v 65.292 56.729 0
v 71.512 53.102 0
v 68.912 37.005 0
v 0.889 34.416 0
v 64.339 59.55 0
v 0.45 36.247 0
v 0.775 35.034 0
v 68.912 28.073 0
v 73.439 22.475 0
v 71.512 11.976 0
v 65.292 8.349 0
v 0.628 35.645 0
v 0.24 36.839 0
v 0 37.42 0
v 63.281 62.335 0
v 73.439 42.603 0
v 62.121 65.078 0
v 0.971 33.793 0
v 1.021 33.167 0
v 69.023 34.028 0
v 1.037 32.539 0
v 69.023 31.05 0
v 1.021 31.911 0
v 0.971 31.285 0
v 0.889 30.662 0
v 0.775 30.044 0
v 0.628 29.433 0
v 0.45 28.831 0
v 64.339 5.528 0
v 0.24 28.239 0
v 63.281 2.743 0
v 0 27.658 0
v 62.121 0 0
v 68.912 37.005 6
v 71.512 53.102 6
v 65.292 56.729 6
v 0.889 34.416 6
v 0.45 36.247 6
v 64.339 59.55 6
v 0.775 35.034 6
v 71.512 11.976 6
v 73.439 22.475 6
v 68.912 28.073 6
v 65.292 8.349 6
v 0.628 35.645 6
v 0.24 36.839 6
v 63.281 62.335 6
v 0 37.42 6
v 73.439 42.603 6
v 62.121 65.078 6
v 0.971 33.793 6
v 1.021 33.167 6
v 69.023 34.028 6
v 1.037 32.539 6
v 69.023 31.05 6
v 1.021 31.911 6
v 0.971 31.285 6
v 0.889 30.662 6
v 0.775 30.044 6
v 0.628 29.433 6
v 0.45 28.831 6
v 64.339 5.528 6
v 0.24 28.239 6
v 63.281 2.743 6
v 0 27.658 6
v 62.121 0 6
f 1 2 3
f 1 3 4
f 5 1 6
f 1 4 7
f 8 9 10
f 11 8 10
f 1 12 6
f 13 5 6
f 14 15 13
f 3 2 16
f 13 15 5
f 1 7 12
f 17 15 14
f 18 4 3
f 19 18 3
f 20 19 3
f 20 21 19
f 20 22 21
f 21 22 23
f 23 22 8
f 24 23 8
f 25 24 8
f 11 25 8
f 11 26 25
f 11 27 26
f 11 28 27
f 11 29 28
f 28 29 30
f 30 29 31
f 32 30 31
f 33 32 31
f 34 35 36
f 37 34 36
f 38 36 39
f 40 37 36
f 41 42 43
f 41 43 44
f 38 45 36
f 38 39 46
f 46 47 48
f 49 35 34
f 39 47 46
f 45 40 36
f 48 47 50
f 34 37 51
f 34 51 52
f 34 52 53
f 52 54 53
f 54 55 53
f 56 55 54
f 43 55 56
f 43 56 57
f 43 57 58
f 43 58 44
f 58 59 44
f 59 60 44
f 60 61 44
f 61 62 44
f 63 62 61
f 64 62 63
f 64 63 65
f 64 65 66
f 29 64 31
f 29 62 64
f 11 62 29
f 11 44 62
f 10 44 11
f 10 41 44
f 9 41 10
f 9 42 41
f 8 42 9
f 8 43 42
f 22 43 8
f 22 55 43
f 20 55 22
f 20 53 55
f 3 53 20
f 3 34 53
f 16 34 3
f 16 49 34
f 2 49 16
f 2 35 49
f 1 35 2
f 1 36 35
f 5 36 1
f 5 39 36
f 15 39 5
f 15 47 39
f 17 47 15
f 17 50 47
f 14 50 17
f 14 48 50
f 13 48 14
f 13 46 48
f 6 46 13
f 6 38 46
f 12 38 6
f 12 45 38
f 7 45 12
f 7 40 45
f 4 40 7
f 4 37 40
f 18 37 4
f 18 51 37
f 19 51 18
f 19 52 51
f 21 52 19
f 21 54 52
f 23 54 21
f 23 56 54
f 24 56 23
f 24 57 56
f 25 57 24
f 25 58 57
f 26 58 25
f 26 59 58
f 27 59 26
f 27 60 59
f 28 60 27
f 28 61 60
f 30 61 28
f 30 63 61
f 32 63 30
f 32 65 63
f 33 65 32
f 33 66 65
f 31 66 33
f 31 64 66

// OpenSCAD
$fn = 32;

// ----------------------------------------------------------------------
// Gear sector: 2 teeth on 48 degrees
// ----------------------------------------------------------------------

// --- parameters (mm) ---
sector_angle = 48;        // sector angle, degrees
root_r = 80;              // root circle radius
tooth_h = 5;              // tooth height over the root circle
teeth = 2;                // number of teeth on the sector
hub_r = 12;               // hub bore radius
plate_t = 6;              // sector thickness, Z
arc_step = 3;             // sampling step of the root/hub arcs, degrees
fit_tol = 0.1;            // declared fit tolerance (prompt contract)
free_tol = 0.5;           // declared free tolerance (prompt contract)

tip_r = root_r + tooth_h;  // tip circle radius

profile = [[62.121, 0], [63.281, 2.743], [64.339, 5.528], [65.292, 8.349], [71.512, 11.976], [73.439, 22.475], [68.912, 28.073], [69.023, 31.05], [69.023, 34.028], [68.912, 37.005], [73.439, 42.603], [71.512, 53.102], [65.292, 56.729], [64.339, 59.55], [63.281, 62.335], [62.121, 65.078], [0, 37.42], [0.24, 36.839], [0.45, 36.247], [0.628, 35.645], [0.775, 35.034], [0.889, 34.416], [0.971, 33.793], [1.021, 33.167], [1.037, 32.539], [1.021, 31.911], [0.971, 31.285], [0.889, 30.662], [0.775, 30.044], [0.628, 29.433], [0.45, 28.831], [0.24, 28.239], [0, 27.658]];  // primary outline, 33 points, counter clockwise

// --- the one profile operation ---
linear_extrude(height = plate_t) polygon(points = profile);
